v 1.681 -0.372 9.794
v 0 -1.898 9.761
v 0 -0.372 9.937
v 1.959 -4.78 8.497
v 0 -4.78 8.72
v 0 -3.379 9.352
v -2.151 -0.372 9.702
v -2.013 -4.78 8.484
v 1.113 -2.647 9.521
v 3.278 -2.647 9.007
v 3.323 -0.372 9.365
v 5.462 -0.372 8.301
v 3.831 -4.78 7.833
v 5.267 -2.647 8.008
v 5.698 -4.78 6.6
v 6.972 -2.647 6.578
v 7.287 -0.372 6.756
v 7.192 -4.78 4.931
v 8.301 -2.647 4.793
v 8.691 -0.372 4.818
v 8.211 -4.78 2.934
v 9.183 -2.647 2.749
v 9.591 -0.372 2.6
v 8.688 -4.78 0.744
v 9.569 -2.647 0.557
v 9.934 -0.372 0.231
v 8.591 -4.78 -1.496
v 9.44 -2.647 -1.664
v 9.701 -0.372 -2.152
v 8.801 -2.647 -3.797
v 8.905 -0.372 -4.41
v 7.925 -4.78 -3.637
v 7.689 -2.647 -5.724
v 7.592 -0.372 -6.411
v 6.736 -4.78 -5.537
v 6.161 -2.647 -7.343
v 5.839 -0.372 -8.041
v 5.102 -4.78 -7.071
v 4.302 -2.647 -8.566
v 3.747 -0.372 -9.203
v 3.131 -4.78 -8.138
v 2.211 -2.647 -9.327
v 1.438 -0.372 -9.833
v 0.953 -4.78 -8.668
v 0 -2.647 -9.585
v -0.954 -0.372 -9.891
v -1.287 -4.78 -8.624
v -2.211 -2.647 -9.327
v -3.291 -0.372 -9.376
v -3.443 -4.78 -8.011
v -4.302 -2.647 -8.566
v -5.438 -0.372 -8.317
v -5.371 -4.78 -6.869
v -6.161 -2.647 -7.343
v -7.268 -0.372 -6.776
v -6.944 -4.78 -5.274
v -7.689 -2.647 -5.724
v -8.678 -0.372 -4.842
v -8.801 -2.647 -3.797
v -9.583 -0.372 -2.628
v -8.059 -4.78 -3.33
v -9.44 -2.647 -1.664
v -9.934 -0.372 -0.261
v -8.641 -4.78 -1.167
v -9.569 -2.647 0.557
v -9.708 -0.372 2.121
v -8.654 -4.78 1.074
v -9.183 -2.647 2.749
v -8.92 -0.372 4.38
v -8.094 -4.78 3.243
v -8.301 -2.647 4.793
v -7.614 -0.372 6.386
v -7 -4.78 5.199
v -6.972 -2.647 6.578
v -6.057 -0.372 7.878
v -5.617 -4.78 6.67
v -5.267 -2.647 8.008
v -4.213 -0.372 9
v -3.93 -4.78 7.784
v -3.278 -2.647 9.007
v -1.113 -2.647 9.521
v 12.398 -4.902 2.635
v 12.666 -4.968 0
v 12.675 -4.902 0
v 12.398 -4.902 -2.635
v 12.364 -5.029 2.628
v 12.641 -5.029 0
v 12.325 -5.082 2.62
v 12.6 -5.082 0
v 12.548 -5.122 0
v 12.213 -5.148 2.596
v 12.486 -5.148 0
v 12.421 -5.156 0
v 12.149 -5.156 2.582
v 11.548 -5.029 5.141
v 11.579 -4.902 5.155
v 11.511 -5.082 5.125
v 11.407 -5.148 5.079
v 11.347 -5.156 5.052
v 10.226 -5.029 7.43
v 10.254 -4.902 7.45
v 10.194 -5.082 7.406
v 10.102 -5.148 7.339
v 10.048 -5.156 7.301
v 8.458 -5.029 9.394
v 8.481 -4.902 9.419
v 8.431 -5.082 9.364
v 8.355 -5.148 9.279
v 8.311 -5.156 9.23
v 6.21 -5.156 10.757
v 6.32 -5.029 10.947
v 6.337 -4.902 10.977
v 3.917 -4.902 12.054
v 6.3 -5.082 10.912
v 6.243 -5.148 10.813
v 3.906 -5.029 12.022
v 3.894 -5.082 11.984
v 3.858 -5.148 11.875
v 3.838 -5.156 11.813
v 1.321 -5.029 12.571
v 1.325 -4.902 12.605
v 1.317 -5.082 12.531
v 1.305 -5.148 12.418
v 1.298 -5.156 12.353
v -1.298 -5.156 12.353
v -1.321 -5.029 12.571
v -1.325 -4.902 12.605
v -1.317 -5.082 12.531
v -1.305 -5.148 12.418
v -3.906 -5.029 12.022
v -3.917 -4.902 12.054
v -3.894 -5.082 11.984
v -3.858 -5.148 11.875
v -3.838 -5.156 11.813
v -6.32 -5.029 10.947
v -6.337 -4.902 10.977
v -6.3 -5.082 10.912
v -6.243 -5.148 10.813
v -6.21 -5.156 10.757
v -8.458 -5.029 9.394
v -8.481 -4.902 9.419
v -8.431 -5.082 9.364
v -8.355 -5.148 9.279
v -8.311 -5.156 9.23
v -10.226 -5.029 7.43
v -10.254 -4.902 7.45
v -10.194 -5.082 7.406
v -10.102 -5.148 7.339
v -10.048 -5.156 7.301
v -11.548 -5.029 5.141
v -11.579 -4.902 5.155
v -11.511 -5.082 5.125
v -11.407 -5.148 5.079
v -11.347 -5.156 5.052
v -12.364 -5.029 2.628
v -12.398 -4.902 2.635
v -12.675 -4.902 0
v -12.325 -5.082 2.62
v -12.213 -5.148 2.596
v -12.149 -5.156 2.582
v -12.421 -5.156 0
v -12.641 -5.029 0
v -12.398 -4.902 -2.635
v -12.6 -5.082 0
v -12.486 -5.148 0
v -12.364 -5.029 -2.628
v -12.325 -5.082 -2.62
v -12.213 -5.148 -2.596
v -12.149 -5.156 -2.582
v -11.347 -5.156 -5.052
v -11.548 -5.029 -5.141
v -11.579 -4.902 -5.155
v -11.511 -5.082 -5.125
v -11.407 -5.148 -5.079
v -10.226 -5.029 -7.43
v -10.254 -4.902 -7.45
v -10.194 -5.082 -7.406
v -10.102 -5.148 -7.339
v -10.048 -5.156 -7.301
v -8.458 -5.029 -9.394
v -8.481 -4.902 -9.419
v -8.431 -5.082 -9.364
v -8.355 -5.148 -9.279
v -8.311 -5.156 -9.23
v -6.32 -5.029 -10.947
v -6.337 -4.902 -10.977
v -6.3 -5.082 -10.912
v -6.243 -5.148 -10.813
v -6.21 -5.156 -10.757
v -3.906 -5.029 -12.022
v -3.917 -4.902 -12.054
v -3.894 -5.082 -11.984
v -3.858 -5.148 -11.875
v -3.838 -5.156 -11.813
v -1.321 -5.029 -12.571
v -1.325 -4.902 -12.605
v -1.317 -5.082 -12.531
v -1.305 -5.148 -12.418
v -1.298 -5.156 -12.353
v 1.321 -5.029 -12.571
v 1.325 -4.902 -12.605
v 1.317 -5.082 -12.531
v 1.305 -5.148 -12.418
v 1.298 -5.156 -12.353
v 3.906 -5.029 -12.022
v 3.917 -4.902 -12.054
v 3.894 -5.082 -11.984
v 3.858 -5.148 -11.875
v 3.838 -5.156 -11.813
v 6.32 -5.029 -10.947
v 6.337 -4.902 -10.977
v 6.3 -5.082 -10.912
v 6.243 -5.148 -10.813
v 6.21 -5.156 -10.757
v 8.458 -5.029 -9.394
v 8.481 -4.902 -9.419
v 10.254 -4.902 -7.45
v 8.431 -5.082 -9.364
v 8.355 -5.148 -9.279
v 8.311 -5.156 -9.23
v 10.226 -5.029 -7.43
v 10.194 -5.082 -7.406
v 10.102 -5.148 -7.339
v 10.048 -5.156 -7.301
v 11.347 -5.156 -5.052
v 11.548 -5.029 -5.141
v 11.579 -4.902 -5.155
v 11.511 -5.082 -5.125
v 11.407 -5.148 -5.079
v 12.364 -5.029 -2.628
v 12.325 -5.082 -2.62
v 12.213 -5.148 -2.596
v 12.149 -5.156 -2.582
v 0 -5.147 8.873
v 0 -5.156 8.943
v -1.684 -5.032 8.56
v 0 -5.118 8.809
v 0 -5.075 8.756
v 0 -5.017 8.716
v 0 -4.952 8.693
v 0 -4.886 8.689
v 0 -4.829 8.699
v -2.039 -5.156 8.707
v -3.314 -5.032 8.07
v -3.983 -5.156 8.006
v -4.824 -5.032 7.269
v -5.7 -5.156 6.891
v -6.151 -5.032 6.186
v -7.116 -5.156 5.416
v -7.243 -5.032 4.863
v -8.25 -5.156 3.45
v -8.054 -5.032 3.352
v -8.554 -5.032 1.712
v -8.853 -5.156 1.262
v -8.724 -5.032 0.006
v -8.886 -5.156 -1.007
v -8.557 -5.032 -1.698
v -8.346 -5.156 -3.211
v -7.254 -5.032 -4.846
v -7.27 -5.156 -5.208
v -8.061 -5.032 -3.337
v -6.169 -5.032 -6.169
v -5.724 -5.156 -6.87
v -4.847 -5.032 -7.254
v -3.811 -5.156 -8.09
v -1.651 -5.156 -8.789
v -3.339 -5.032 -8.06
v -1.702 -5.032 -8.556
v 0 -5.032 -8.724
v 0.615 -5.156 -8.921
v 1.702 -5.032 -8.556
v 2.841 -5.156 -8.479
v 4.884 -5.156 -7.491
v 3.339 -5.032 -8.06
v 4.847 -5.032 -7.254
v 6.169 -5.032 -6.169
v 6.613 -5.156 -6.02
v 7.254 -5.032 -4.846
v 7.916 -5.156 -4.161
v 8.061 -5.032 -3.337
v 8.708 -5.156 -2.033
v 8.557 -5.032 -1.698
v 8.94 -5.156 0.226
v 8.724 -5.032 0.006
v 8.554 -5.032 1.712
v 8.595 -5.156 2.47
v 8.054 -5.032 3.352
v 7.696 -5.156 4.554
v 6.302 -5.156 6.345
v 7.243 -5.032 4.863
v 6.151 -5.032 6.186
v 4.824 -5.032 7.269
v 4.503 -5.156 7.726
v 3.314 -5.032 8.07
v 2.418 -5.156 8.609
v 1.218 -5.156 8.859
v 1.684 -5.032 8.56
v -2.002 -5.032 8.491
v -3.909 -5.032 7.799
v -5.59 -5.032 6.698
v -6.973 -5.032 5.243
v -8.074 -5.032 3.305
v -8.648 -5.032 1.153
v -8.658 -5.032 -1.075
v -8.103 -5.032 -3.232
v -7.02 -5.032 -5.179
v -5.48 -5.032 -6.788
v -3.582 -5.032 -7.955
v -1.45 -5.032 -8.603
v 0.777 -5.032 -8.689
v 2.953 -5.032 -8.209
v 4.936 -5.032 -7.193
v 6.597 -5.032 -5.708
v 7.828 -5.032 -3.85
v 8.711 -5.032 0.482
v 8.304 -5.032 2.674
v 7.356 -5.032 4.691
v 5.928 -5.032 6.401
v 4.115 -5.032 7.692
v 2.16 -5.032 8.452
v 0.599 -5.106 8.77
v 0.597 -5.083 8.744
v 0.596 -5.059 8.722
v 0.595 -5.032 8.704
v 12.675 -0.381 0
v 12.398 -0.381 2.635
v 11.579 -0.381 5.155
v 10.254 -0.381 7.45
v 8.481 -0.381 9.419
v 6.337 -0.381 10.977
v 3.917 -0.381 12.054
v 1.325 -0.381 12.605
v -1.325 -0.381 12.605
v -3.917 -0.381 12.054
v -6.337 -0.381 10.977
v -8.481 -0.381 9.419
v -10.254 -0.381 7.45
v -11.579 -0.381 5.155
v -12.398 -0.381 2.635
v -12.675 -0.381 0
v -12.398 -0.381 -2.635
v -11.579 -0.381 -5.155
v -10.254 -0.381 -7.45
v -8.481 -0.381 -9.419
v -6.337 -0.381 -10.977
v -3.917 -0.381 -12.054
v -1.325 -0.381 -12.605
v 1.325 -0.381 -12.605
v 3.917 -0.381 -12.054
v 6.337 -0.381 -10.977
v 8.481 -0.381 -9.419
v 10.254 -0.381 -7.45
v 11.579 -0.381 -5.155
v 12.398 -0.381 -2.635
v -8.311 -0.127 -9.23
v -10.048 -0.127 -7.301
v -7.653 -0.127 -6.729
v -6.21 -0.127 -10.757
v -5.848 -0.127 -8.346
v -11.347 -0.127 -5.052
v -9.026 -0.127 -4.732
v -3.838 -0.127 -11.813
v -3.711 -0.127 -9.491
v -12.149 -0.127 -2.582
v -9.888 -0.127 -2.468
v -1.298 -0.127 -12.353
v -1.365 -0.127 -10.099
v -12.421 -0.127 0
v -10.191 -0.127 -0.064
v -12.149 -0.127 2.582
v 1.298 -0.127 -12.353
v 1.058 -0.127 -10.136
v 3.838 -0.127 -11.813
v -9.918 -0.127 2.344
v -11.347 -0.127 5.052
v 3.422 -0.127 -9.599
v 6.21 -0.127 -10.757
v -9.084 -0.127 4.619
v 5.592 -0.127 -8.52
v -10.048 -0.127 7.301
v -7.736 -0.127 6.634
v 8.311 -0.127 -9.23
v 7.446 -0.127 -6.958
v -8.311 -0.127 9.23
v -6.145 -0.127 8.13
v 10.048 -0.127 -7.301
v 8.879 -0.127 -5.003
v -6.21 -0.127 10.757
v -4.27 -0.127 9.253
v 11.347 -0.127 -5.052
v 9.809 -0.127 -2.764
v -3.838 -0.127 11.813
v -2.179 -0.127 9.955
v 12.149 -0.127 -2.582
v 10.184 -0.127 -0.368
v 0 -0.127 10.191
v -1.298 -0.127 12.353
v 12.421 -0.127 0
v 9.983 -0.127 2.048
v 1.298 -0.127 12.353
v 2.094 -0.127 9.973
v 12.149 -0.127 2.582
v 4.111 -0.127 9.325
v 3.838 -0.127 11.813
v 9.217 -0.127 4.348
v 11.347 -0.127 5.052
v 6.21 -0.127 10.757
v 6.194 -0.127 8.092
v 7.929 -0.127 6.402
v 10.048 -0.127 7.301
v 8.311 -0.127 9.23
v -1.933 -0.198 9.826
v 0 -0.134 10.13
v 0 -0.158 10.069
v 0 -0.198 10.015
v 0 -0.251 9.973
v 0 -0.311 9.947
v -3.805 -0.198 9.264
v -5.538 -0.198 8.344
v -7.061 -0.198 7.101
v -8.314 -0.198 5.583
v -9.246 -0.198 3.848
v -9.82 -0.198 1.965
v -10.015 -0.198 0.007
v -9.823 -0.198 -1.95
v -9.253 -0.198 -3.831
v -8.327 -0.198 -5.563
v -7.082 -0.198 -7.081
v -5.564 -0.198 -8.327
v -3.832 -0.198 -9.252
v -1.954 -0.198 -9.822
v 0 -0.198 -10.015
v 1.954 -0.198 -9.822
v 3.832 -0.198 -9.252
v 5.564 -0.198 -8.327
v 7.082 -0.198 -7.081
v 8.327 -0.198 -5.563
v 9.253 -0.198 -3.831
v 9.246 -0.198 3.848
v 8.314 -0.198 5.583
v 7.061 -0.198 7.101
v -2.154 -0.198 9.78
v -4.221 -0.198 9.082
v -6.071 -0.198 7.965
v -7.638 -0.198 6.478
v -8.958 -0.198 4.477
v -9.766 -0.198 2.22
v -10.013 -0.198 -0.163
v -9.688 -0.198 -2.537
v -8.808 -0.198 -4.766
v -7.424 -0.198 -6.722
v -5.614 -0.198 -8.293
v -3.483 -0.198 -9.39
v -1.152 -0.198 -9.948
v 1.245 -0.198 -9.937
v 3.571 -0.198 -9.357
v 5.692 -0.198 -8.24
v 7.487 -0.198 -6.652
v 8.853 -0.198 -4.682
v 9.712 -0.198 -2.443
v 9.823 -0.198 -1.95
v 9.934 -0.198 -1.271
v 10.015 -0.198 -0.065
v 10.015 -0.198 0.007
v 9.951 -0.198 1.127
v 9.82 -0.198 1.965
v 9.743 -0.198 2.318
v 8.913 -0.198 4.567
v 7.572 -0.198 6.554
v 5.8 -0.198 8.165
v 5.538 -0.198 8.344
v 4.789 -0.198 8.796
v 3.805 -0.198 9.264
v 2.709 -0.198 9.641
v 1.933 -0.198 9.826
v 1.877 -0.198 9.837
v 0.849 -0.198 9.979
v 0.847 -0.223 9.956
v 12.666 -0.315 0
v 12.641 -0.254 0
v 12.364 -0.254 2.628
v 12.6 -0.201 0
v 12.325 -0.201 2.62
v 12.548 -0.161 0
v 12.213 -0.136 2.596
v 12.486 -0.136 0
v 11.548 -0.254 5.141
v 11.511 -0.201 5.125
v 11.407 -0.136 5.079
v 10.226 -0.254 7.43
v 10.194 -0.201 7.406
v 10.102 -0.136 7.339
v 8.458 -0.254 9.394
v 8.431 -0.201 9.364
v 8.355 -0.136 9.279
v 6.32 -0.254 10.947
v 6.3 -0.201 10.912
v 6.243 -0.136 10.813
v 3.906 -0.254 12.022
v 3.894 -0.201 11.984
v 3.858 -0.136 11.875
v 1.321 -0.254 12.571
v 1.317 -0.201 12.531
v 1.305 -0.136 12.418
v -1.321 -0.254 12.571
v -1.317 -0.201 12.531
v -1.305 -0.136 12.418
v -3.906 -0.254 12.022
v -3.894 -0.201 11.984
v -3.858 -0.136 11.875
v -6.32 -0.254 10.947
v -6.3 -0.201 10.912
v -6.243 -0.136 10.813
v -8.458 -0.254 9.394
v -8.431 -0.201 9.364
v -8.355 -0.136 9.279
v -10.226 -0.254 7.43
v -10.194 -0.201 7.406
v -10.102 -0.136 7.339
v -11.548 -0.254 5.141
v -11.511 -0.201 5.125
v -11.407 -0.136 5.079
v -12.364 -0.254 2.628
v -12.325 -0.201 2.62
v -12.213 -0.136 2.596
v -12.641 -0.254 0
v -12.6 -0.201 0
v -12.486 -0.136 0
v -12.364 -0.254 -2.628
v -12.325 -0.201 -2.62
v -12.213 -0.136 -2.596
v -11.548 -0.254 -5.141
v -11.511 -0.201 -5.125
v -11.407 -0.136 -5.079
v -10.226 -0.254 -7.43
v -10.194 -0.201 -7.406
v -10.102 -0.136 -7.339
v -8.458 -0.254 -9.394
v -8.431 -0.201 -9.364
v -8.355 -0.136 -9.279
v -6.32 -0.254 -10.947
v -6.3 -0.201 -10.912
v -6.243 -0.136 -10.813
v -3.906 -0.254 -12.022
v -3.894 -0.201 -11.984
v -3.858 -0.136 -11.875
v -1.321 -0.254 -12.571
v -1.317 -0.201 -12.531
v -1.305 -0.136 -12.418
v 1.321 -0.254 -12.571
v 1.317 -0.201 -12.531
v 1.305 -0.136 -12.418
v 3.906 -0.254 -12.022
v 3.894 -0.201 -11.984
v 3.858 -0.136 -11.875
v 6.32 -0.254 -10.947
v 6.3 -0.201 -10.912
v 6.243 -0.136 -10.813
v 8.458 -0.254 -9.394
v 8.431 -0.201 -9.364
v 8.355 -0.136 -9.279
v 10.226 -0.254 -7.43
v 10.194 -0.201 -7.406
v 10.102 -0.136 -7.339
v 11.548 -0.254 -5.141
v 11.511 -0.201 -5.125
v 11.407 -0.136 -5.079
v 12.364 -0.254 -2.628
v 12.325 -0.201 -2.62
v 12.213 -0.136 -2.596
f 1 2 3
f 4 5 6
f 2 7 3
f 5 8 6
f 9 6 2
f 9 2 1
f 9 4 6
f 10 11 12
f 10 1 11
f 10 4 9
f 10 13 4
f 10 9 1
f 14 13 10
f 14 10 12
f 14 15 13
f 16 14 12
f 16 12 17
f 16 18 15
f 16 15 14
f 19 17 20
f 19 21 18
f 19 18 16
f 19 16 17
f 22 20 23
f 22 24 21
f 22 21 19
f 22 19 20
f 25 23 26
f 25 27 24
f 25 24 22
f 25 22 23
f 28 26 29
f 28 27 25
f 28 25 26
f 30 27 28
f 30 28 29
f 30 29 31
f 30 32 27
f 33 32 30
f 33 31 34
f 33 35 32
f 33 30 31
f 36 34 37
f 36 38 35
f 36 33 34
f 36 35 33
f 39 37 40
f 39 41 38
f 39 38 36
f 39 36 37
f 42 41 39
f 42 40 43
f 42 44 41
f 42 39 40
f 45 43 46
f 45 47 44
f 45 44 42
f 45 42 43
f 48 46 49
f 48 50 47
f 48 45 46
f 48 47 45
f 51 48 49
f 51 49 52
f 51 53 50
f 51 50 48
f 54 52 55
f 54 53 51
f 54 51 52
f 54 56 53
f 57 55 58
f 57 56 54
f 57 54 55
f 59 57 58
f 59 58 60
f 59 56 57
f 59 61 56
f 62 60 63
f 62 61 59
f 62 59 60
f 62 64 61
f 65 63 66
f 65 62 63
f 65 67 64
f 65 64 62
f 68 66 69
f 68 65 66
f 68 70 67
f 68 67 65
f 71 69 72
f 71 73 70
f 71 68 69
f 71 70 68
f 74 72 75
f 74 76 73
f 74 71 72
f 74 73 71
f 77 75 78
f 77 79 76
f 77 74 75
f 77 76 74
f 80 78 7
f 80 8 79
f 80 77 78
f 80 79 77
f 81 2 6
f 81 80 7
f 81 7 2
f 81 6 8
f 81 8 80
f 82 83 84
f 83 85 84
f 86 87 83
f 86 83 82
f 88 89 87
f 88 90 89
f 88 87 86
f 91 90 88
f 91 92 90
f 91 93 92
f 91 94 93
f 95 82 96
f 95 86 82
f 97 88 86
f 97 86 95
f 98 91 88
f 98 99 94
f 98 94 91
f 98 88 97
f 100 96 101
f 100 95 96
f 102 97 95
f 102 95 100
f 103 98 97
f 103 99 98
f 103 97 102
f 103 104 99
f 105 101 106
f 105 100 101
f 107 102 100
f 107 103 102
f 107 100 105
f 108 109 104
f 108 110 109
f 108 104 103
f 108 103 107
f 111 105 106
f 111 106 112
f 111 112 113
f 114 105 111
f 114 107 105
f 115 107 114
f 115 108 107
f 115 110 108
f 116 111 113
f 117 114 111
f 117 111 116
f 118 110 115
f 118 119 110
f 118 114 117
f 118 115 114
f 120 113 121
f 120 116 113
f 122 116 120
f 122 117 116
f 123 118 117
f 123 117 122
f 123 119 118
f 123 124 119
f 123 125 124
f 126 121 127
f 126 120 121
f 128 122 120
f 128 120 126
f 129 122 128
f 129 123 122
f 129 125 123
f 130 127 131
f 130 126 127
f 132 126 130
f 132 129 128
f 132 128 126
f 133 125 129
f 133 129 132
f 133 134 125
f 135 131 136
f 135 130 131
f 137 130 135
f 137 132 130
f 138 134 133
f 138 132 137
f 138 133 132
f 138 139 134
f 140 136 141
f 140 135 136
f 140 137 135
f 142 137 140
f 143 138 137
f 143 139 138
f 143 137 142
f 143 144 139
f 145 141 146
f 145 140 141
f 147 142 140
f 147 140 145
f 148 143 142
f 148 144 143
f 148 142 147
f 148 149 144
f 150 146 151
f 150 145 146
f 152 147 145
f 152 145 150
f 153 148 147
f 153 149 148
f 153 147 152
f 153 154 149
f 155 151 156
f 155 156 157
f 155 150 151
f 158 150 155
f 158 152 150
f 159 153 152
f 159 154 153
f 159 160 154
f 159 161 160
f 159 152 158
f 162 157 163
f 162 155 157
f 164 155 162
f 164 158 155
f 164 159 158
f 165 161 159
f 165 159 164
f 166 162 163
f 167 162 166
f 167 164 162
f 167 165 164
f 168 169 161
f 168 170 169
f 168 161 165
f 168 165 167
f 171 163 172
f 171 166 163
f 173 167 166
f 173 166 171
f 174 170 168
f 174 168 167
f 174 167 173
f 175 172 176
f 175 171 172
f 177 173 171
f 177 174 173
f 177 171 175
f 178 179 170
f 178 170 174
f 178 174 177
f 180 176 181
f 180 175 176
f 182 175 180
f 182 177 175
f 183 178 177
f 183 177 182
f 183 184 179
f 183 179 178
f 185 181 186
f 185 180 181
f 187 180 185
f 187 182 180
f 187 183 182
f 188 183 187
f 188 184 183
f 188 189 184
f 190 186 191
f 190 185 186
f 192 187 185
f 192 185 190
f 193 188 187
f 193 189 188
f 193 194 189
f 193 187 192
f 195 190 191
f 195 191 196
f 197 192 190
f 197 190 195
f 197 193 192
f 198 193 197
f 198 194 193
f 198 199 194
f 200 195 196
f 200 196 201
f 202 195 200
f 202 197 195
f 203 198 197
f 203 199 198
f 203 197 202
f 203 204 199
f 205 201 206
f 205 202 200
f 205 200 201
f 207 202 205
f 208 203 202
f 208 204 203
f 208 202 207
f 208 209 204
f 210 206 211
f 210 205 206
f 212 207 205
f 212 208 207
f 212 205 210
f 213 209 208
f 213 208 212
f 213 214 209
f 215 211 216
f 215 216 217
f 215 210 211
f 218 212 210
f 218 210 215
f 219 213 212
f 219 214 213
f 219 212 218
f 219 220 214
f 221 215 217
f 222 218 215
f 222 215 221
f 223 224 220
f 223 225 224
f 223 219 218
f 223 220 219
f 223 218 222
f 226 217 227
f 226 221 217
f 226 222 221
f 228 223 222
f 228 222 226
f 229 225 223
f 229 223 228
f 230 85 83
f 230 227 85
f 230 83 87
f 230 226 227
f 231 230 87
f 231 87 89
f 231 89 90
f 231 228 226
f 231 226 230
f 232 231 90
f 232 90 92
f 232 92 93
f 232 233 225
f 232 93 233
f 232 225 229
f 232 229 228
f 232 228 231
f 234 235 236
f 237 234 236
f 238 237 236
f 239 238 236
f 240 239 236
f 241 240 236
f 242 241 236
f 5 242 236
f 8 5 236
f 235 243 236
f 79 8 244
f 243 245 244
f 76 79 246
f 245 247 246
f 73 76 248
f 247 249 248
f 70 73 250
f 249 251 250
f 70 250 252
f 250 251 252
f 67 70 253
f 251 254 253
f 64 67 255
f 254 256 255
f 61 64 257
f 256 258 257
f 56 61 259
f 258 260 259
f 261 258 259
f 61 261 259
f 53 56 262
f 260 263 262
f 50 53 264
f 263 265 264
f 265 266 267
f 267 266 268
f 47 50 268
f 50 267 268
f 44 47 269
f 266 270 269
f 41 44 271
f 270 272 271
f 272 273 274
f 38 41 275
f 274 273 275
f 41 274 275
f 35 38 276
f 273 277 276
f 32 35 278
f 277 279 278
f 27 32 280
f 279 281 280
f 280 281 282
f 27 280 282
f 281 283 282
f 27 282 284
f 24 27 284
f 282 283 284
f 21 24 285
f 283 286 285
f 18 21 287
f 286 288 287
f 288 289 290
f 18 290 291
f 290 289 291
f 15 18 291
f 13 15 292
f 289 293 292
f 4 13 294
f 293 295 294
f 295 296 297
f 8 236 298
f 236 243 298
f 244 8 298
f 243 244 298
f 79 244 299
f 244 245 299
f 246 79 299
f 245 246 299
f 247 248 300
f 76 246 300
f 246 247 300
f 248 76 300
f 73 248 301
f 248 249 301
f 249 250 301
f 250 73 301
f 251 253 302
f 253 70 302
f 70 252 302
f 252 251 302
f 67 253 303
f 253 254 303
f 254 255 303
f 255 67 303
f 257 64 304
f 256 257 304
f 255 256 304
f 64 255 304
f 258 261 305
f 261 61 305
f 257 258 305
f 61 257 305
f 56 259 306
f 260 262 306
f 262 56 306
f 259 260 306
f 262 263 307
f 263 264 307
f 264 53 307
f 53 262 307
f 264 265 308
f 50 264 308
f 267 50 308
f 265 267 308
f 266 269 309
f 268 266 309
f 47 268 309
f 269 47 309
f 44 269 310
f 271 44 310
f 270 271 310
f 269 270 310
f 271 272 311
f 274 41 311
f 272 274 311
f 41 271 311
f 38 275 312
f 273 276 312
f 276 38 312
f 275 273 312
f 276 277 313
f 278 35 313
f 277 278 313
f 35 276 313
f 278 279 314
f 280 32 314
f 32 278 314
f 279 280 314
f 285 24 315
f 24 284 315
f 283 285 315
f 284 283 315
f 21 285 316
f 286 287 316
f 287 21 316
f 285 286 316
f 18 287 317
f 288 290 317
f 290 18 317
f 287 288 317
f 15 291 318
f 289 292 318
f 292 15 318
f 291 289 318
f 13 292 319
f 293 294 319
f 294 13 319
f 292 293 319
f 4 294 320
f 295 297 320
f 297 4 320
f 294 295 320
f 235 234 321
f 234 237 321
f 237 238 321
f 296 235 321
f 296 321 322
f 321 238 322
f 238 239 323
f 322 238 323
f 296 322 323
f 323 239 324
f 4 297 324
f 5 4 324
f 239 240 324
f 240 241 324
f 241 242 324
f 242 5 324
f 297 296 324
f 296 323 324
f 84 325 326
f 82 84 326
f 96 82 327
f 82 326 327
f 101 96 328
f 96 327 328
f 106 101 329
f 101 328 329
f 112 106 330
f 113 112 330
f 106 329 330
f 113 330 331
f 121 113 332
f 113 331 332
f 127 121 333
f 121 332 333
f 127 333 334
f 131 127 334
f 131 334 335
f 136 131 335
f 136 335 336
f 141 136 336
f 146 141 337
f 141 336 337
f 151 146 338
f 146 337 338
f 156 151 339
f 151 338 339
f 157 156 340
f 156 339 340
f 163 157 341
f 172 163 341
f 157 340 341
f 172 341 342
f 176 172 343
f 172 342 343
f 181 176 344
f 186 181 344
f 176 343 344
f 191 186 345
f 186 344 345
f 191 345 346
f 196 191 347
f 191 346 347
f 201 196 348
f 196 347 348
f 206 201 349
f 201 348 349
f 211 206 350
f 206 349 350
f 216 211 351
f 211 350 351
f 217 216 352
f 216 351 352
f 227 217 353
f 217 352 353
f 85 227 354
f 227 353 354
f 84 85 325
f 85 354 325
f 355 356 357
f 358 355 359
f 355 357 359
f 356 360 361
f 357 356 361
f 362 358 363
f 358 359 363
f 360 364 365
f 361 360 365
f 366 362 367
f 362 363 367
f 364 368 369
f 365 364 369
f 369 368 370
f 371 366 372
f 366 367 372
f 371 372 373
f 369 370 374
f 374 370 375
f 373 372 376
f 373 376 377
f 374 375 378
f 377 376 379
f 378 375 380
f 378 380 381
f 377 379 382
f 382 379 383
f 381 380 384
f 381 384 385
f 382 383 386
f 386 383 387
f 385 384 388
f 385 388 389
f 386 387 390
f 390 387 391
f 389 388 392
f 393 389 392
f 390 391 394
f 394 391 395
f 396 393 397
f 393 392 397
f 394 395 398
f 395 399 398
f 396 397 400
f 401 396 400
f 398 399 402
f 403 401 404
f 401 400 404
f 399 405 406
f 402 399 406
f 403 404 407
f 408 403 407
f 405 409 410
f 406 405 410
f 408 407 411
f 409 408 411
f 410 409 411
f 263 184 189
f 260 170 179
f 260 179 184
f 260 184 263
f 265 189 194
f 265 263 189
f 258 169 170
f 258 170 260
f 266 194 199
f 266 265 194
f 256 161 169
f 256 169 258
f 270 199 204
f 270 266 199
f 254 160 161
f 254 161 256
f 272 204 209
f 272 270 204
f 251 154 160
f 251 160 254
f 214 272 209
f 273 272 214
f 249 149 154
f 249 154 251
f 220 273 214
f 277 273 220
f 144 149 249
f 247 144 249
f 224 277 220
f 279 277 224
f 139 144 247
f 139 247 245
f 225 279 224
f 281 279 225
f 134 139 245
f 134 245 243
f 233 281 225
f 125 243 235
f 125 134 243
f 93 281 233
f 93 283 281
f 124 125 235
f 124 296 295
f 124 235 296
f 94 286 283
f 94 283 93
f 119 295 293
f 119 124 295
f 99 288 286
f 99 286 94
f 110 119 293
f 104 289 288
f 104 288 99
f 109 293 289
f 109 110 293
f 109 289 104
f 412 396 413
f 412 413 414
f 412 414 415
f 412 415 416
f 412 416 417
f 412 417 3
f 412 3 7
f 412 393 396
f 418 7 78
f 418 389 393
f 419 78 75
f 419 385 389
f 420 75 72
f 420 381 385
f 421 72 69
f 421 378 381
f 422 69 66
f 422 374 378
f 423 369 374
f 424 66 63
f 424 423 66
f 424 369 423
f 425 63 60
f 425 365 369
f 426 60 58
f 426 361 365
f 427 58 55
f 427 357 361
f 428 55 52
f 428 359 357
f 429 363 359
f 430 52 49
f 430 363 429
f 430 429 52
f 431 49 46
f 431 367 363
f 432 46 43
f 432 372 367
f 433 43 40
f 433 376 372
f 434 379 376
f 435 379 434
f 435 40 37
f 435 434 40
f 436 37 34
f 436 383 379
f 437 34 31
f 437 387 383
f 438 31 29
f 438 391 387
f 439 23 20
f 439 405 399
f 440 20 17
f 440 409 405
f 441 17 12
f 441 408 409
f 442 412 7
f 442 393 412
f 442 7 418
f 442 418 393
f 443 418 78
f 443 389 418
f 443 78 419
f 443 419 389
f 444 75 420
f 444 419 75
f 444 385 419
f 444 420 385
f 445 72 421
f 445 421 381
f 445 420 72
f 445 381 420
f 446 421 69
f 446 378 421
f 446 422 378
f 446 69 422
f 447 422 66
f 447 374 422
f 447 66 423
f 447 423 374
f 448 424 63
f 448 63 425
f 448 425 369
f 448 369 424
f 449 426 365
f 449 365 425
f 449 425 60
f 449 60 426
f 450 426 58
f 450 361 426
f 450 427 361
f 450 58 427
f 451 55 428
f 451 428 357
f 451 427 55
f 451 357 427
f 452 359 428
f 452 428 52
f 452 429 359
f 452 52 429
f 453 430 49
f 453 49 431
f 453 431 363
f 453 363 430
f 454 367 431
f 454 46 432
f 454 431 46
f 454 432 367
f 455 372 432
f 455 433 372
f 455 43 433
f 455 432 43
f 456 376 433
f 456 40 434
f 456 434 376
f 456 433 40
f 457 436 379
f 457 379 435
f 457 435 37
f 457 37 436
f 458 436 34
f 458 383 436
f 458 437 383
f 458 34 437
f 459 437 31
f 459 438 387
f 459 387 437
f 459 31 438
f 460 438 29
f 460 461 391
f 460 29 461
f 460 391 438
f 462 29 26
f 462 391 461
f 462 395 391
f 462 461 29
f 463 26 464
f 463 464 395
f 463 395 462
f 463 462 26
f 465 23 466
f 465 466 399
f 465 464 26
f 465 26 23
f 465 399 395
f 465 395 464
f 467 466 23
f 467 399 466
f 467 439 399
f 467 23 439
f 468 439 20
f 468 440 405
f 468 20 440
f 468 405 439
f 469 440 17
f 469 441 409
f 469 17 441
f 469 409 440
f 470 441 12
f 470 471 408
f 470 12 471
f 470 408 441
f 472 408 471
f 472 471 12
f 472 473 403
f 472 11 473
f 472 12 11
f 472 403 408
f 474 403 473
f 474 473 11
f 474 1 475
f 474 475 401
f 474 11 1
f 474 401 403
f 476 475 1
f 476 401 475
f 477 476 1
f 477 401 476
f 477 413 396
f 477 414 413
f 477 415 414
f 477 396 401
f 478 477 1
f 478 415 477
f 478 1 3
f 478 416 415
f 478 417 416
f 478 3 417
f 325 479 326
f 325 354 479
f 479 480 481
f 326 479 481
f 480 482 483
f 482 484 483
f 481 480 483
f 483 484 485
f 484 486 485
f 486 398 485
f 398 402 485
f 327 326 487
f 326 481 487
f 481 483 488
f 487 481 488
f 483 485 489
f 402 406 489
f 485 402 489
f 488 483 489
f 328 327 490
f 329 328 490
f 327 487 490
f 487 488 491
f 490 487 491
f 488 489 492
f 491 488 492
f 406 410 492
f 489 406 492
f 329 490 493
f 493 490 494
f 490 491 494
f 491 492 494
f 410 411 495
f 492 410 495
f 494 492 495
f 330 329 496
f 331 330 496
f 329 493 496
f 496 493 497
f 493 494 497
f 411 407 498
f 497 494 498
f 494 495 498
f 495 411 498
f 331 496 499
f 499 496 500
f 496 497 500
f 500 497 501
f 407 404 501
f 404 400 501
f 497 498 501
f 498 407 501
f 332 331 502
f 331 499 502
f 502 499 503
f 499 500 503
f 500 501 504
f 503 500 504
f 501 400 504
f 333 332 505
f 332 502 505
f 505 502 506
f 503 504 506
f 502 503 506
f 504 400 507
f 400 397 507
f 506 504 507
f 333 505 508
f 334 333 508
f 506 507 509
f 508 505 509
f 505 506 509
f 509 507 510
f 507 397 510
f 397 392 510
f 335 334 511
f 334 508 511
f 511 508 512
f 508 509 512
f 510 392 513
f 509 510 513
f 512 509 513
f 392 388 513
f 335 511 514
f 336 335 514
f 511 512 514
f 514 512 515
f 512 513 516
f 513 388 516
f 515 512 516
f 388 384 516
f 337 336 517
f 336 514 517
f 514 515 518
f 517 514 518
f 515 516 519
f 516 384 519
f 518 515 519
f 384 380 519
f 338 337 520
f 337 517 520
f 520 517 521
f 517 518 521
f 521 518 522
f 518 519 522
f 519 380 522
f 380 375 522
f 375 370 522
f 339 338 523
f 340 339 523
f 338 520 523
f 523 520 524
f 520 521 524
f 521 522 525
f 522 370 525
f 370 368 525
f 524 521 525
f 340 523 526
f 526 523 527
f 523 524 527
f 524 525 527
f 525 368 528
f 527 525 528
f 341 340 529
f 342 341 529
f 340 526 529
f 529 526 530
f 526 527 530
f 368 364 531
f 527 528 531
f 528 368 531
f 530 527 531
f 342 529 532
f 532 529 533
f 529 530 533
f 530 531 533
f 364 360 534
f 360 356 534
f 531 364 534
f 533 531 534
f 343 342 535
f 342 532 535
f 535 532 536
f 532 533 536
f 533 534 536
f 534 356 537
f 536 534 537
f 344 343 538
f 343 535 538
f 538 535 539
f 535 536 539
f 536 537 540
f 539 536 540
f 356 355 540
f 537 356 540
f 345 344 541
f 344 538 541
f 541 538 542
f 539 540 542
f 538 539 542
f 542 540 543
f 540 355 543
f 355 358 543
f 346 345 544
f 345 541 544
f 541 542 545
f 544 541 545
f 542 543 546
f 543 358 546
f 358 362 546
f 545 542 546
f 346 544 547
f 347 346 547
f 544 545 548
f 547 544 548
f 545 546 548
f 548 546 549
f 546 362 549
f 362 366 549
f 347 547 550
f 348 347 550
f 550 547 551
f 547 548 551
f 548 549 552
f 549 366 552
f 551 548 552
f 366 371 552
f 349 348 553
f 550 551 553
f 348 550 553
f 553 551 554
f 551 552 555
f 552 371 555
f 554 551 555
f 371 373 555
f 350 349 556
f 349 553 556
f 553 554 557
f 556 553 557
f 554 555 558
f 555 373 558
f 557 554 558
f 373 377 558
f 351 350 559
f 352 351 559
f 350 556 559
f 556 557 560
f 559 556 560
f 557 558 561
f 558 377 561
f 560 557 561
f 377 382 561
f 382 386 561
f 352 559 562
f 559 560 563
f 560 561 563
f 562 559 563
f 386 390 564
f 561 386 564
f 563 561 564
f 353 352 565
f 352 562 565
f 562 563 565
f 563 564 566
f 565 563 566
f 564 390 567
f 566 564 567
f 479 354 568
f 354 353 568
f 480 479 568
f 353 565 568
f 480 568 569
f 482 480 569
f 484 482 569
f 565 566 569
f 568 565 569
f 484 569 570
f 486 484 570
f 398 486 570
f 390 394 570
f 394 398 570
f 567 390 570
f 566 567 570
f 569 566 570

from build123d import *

# Parameters (mm, degrees)
F1_R     = 12.6746
F2_DEPTH = 5.0292
F5_R     = 0.254


with BuildPart() as f2:
    # F1 (on offset) → F2 (new body)
    with BuildSketch(Plane.XZ.offset(0.127)):
        Circle(F1_R)
    extrude(amount=F2_DEPTH)

    # F3 (on Right) → F4 (revolve, cut)
    with BuildSketch(Plane.YZ):
        with BuildLine():
            Line((-9.9441, 0), (0, 0))
            Line((0, 0), (9.9441, 0))
            ThreePointArc((9.9441, 0), (0, 9.9441), (-9.9441, 0))
        make_face()
    revolve(axis=Axis((0, 4.97205, 0), (0, 1, 0)), mode=Mode.SUBTRACT)

    # F5
    f5_edges = [f2.edges().sort_by_distance(p)[0] for p in [
        (0, -5.1562, -8.502866),
        (-12.6746, -5.1562, 0),
        (-12.6746, -0.127, 0),
        (0, -0.127, -9.943289),
    ]]
    fillet(f5_edges, radius=F5_R)


solid = f2.part
